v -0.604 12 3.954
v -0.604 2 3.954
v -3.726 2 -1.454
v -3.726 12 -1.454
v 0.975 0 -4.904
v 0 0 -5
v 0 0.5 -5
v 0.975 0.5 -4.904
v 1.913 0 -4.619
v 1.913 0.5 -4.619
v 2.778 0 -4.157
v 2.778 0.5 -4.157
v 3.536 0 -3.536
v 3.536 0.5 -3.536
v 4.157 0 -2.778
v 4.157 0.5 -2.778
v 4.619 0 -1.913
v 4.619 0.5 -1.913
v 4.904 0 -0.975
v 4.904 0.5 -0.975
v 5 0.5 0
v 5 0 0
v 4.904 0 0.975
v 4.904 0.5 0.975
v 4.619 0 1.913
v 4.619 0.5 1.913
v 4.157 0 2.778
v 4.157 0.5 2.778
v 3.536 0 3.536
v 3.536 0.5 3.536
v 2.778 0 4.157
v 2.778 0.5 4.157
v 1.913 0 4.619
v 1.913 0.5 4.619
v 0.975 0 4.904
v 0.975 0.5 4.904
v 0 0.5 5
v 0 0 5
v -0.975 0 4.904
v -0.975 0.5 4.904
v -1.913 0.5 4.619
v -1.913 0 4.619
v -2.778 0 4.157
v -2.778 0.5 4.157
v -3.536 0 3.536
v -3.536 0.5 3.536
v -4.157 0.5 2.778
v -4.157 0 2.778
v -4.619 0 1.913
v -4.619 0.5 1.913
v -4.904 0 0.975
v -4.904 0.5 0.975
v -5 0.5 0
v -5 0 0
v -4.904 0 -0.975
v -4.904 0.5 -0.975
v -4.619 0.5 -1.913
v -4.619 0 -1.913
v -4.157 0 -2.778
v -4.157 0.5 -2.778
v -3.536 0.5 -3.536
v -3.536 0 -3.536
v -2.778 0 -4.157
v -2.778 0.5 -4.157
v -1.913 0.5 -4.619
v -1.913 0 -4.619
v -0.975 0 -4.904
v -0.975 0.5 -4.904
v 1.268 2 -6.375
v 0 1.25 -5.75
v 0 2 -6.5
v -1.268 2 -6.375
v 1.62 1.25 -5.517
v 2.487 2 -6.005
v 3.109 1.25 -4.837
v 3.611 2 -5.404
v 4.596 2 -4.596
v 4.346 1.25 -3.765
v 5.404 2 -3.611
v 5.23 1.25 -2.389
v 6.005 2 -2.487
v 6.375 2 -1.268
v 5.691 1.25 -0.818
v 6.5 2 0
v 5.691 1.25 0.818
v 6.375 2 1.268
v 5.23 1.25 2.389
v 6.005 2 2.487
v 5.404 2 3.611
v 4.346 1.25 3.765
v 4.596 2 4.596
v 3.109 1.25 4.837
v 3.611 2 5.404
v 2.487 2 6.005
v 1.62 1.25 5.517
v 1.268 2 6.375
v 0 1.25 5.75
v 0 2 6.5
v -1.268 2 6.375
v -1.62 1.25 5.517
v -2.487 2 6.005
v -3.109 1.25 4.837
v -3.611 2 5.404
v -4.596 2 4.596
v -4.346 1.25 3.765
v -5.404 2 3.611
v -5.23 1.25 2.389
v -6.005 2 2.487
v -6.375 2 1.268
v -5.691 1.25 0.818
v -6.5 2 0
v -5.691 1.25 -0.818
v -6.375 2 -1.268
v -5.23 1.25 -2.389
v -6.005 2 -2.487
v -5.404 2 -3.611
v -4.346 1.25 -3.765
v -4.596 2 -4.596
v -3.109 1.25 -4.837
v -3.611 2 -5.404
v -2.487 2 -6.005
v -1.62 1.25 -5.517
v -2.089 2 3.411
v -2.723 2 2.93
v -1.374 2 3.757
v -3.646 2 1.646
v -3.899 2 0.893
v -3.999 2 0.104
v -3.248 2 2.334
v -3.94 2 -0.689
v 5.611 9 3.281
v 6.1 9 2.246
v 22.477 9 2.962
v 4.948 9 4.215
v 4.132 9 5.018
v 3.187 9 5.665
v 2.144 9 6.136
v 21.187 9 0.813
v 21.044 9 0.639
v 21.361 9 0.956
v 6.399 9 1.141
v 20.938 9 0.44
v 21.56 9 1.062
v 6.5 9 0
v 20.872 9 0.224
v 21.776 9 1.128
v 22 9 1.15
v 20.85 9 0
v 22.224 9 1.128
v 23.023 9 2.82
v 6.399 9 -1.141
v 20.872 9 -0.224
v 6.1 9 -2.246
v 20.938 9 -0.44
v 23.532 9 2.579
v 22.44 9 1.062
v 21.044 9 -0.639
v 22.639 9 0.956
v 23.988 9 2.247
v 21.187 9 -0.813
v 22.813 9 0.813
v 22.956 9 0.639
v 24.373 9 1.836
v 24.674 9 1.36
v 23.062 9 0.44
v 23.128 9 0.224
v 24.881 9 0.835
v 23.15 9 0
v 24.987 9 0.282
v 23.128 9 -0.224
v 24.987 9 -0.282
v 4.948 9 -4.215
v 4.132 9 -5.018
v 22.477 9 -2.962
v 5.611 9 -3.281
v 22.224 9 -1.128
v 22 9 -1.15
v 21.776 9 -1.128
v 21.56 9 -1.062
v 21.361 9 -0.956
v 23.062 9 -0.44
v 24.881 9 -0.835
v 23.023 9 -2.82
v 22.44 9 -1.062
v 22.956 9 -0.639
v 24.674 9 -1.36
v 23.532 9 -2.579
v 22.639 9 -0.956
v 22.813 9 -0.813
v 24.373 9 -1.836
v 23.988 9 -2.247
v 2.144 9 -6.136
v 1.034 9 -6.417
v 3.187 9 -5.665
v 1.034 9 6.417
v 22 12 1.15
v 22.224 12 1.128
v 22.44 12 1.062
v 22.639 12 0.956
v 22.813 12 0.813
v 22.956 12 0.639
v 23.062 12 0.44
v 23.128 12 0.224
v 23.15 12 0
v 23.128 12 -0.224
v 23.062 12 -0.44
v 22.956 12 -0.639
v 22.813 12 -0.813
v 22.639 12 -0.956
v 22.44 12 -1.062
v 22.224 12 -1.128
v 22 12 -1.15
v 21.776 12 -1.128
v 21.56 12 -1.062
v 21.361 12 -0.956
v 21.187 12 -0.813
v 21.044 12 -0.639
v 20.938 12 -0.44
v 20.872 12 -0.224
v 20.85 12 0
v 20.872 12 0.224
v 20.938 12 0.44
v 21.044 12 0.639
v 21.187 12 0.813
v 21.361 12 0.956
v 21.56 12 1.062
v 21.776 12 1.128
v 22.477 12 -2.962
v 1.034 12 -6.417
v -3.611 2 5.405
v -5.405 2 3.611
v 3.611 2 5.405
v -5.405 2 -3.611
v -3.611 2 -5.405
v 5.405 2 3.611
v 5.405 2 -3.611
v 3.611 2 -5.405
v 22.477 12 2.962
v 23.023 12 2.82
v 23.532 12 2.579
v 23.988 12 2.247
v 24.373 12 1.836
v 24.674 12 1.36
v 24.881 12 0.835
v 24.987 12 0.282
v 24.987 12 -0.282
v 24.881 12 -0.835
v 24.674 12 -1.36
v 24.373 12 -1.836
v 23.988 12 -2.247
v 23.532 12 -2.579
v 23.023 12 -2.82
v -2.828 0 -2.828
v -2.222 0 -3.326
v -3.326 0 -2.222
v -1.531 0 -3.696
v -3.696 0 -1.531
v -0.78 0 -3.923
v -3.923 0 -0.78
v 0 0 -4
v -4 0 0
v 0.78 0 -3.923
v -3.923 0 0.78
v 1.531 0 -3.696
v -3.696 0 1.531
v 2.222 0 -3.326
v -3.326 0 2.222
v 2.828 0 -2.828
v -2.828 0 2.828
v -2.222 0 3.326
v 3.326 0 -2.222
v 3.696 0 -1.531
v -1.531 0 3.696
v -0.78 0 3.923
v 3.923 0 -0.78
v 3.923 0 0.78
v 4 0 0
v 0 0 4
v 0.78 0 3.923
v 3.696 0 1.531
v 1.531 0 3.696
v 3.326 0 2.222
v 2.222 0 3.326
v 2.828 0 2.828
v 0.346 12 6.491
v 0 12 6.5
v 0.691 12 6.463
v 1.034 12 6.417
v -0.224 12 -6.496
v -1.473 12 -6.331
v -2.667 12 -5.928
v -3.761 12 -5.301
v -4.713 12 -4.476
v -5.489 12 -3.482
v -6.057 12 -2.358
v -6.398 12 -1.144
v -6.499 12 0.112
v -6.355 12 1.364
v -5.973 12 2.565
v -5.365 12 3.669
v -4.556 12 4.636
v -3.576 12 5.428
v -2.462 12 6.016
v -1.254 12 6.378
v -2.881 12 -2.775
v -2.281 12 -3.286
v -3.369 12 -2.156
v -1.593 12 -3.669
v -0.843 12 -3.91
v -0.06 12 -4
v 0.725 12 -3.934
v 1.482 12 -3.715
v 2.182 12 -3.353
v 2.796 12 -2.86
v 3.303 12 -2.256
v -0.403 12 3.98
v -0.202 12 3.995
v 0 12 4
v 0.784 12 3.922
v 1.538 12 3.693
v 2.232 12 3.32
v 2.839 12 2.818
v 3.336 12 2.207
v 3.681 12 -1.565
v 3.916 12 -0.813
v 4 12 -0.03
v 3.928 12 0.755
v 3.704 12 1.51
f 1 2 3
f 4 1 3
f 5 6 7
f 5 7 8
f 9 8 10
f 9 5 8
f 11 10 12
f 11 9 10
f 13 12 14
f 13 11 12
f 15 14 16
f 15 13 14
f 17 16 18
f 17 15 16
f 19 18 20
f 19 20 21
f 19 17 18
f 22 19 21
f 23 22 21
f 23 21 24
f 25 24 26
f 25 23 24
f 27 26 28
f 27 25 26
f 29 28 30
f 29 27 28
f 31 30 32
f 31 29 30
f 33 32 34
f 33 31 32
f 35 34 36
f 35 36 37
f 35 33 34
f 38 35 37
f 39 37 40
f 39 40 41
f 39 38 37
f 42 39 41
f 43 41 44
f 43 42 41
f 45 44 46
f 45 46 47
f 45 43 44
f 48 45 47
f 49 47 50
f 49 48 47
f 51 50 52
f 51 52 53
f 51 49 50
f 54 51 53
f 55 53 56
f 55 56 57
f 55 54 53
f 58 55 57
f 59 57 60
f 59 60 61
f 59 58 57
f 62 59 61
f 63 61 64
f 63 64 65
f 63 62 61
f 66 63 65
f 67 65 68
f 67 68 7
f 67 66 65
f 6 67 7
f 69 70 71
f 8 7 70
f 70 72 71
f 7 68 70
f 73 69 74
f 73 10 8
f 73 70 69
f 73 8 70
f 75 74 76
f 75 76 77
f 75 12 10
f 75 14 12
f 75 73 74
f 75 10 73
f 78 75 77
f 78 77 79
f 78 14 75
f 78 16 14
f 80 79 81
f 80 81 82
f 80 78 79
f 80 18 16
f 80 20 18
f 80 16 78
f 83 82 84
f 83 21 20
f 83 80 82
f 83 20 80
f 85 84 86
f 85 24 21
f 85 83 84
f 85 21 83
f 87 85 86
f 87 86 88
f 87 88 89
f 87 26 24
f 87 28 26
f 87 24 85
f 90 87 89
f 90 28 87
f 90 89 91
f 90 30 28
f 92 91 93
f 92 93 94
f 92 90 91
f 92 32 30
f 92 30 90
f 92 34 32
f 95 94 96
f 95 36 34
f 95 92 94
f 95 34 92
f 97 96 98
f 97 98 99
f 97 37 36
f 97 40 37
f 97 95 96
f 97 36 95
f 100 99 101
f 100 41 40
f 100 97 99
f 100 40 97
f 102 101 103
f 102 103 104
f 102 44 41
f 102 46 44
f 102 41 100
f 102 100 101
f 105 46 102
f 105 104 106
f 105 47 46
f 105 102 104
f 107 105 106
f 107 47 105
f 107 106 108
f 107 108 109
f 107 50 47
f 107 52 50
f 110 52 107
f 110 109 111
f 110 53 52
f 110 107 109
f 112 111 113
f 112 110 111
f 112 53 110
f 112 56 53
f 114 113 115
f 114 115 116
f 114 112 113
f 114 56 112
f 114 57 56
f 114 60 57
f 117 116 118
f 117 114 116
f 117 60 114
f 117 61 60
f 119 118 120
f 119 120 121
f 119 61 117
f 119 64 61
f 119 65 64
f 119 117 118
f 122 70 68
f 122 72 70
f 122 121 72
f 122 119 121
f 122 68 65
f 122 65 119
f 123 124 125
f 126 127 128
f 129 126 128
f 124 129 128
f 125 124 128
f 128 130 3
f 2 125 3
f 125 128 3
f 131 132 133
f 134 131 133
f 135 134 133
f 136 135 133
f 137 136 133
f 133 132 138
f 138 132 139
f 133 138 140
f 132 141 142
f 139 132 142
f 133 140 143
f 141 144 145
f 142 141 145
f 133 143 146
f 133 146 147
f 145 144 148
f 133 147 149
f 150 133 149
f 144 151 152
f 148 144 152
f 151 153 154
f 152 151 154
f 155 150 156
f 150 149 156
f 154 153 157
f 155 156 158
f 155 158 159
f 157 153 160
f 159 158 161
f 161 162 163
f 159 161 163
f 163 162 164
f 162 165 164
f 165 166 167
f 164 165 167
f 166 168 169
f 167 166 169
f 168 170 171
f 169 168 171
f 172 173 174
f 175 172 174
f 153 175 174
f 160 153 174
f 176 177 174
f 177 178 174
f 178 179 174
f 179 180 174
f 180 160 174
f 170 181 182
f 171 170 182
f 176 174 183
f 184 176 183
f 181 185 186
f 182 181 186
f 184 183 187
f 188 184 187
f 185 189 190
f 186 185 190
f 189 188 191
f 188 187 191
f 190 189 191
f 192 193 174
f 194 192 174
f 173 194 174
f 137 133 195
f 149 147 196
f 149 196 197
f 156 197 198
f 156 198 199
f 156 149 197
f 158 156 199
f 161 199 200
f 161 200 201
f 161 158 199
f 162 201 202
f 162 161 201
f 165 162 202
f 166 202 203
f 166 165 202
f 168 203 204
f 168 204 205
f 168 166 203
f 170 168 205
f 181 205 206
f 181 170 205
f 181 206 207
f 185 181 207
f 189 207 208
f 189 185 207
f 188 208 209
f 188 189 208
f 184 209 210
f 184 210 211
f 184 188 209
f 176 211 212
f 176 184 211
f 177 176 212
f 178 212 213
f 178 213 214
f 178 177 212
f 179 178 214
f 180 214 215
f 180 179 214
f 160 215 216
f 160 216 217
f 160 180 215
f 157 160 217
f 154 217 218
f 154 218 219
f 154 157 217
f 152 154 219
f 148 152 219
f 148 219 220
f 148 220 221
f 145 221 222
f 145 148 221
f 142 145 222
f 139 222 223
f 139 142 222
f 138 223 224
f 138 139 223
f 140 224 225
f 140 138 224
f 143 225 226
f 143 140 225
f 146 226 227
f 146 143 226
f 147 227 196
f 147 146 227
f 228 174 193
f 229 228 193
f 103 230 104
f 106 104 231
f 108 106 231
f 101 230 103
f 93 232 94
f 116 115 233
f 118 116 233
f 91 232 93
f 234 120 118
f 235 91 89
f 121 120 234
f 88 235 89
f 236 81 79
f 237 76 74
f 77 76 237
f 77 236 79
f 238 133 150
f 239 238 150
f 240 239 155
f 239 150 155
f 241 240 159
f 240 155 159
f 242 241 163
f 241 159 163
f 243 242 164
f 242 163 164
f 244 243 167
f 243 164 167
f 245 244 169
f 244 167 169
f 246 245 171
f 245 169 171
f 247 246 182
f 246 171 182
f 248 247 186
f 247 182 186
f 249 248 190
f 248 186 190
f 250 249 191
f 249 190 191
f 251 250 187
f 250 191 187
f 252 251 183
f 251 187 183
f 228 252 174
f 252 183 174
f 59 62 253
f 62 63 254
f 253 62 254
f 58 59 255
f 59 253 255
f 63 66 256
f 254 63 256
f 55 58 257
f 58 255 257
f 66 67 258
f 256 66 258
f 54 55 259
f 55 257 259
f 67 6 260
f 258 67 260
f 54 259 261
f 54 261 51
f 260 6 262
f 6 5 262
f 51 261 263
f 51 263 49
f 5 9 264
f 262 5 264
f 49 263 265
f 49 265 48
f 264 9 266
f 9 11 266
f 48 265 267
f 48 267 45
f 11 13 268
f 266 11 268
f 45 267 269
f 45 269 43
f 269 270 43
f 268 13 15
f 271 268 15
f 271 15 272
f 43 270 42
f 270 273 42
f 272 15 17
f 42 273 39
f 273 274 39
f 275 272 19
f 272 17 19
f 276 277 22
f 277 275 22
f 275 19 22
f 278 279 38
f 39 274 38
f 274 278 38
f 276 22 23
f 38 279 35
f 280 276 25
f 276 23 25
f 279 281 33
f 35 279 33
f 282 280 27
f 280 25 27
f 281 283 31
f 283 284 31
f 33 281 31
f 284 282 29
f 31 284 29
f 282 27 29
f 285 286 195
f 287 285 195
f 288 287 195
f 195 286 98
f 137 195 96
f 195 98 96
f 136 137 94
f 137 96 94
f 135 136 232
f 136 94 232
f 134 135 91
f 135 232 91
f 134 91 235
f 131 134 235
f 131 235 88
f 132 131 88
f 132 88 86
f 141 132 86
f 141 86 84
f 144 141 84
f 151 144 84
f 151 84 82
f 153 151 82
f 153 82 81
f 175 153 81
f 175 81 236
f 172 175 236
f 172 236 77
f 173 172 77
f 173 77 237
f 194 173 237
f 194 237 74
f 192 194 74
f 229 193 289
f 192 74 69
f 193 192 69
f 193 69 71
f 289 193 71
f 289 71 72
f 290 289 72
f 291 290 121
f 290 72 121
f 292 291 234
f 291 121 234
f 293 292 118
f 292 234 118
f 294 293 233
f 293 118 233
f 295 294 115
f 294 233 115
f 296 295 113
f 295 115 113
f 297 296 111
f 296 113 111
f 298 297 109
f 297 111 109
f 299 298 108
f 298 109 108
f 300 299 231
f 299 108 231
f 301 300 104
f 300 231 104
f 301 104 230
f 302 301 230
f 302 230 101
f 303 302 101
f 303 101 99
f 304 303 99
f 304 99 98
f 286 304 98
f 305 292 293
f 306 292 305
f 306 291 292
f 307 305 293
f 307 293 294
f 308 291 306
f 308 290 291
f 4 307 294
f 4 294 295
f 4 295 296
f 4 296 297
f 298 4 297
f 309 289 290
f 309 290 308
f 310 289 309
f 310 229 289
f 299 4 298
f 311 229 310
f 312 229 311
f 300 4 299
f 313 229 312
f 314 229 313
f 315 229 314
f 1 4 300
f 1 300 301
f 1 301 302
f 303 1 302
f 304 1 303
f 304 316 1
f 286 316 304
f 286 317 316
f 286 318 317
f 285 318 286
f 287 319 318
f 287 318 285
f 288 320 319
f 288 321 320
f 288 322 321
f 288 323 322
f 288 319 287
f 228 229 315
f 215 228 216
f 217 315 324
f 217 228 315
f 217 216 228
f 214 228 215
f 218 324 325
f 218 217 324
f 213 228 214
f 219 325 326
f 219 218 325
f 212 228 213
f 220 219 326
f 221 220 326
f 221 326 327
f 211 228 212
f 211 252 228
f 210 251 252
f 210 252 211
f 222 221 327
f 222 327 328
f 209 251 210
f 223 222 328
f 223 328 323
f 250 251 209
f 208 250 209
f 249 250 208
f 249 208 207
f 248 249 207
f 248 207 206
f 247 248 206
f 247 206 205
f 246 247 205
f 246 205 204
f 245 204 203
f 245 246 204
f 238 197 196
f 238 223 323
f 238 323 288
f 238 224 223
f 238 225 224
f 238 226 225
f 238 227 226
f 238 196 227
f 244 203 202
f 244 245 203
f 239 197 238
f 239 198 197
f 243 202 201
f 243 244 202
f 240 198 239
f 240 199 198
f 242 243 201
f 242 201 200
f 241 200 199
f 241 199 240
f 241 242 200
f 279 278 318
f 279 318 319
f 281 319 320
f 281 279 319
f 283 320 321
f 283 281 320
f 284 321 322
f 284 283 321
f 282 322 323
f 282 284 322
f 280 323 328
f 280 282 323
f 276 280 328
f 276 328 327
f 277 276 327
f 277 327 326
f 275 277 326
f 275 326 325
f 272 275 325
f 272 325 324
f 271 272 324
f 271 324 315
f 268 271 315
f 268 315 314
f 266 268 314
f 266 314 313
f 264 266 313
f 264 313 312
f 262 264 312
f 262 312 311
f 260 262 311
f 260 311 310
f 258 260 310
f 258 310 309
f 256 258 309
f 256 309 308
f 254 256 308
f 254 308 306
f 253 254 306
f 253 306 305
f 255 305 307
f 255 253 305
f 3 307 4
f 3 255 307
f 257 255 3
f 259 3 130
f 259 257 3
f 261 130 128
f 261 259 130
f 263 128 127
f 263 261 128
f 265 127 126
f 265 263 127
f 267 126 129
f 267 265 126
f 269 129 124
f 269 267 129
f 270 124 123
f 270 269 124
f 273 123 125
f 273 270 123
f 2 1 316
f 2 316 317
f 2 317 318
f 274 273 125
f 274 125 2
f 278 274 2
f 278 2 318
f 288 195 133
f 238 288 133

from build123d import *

# Parameters (mm, degrees)
SKETCH1_R           = 6.5
SKETCH1_R_2         = 4
BOSS_EXTRUDE1_DEPTH = 12
BOSS_EXTRUDE2_START = -3
SKETCH2_R           = 1.15
BOSS_EXTRUDE2_DEPTH = 3
SKETCH4_R           = 6.5
SKETCH4_R_2         = 5
CUT_EXTRUDE1_DEPTH  = 2
BOSS_EXTRUDE4_START = -10
BOSS_EXTRUDE4_DEPTH = 10
CHAMFER1_SIZE       = 1.5


with BuildPart() as part:
    # Sketch1 → Boss-Extrude1 (new body)
    with BuildSketch(Plane(origin=(0, 0, 0), x_dir=(1, 0, 0), z_dir=(0, 1, 0))):
        with Locations(Location((0, 0, 0), (0, 0, 270))):
            Circle(SKETCH1_R)
        with Locations(Location((0, 0, 0), (0, 0, 270))):
            Circle(SKETCH1_R_2, mode=Mode.SUBTRACT)
    extrude(amount=BOSS_EXTRUDE1_DEPTH)

    # Sketch2 → Boss-Extrude2 (add)
    with BuildSketch(Plane(origin=(0, 12, 0), x_dir=(1, 0, 0), z_dir=(0, 1, 0)).offset(BOSS_EXTRUDE2_START)):
        with BuildLine():
            Line((22.477272727, 2.961791813), (1.034090909, 6.417215595))
            ThreePointArc((1.034090909, 6.417215595), (4.948312384, 4.214760319), (6.5, 0))
            ThreePointArc((6.5, 0), (4.948312384, -4.214760319), (1.034090909, -6.417215595))
            Line((1.034090909, -6.417215595), (22.477272727, -2.961791813))
            ThreePointArc((22.477272727, -2.961791813), (25, 0), (22.477272727, 2.961791813))
        make_face()
        with Locations(Location((22, 0, 0), (0, 0, 270))):
            Circle(SKETCH2_R, mode=Mode.SUBTRACT)
    extrude(amount=BOSS_EXTRUDE2_DEPTH)

    # Sketch4 → Cut-Extrude1 (cut)
    with BuildSketch(Plane.XZ):
        with Locations(Location((0, 0, 0), (0, 0, 270))):
            Circle(SKETCH4_R)
        with Locations(Location((0, 0, 0), (0, 0, 270))):
            Circle(SKETCH4_R_2, mode=Mode.SUBTRACT)
    extrude(amount=-CUT_EXTRUDE1_DEPTH, mode=Mode.SUBTRACT)

    # Sketch5 → Boss-Extrude4 (add)
    with BuildSketch(Plane(origin=(0, 12, 0), x_dir=(1, 0, 0), z_dir=(0, 1, 0)).offset(BOSS_EXTRUDE4_START)):
        with BuildLine():
            Line((-0.60381401, -3.954163457), (-3.726313009, 1.454163457))
            ThreePointArc((-3.726313009, 1.454163457), (-3.464101615, -2), (-0.60381401, -3.954163457))
        make_face()
    extrude(amount=BOSS_EXTRUDE4_DEPTH)

    # Chamfer1
    chamfer1_edges = [part.edges().sort_by_distance(p)[0] for p in [
        (0, 2, 5),
    ]]
    chamfer(chamfer1_edges, length=CHAMFER1_SIZE - 0.0001)  # a hair under: the kernel refuses the full size


solid = part.part
